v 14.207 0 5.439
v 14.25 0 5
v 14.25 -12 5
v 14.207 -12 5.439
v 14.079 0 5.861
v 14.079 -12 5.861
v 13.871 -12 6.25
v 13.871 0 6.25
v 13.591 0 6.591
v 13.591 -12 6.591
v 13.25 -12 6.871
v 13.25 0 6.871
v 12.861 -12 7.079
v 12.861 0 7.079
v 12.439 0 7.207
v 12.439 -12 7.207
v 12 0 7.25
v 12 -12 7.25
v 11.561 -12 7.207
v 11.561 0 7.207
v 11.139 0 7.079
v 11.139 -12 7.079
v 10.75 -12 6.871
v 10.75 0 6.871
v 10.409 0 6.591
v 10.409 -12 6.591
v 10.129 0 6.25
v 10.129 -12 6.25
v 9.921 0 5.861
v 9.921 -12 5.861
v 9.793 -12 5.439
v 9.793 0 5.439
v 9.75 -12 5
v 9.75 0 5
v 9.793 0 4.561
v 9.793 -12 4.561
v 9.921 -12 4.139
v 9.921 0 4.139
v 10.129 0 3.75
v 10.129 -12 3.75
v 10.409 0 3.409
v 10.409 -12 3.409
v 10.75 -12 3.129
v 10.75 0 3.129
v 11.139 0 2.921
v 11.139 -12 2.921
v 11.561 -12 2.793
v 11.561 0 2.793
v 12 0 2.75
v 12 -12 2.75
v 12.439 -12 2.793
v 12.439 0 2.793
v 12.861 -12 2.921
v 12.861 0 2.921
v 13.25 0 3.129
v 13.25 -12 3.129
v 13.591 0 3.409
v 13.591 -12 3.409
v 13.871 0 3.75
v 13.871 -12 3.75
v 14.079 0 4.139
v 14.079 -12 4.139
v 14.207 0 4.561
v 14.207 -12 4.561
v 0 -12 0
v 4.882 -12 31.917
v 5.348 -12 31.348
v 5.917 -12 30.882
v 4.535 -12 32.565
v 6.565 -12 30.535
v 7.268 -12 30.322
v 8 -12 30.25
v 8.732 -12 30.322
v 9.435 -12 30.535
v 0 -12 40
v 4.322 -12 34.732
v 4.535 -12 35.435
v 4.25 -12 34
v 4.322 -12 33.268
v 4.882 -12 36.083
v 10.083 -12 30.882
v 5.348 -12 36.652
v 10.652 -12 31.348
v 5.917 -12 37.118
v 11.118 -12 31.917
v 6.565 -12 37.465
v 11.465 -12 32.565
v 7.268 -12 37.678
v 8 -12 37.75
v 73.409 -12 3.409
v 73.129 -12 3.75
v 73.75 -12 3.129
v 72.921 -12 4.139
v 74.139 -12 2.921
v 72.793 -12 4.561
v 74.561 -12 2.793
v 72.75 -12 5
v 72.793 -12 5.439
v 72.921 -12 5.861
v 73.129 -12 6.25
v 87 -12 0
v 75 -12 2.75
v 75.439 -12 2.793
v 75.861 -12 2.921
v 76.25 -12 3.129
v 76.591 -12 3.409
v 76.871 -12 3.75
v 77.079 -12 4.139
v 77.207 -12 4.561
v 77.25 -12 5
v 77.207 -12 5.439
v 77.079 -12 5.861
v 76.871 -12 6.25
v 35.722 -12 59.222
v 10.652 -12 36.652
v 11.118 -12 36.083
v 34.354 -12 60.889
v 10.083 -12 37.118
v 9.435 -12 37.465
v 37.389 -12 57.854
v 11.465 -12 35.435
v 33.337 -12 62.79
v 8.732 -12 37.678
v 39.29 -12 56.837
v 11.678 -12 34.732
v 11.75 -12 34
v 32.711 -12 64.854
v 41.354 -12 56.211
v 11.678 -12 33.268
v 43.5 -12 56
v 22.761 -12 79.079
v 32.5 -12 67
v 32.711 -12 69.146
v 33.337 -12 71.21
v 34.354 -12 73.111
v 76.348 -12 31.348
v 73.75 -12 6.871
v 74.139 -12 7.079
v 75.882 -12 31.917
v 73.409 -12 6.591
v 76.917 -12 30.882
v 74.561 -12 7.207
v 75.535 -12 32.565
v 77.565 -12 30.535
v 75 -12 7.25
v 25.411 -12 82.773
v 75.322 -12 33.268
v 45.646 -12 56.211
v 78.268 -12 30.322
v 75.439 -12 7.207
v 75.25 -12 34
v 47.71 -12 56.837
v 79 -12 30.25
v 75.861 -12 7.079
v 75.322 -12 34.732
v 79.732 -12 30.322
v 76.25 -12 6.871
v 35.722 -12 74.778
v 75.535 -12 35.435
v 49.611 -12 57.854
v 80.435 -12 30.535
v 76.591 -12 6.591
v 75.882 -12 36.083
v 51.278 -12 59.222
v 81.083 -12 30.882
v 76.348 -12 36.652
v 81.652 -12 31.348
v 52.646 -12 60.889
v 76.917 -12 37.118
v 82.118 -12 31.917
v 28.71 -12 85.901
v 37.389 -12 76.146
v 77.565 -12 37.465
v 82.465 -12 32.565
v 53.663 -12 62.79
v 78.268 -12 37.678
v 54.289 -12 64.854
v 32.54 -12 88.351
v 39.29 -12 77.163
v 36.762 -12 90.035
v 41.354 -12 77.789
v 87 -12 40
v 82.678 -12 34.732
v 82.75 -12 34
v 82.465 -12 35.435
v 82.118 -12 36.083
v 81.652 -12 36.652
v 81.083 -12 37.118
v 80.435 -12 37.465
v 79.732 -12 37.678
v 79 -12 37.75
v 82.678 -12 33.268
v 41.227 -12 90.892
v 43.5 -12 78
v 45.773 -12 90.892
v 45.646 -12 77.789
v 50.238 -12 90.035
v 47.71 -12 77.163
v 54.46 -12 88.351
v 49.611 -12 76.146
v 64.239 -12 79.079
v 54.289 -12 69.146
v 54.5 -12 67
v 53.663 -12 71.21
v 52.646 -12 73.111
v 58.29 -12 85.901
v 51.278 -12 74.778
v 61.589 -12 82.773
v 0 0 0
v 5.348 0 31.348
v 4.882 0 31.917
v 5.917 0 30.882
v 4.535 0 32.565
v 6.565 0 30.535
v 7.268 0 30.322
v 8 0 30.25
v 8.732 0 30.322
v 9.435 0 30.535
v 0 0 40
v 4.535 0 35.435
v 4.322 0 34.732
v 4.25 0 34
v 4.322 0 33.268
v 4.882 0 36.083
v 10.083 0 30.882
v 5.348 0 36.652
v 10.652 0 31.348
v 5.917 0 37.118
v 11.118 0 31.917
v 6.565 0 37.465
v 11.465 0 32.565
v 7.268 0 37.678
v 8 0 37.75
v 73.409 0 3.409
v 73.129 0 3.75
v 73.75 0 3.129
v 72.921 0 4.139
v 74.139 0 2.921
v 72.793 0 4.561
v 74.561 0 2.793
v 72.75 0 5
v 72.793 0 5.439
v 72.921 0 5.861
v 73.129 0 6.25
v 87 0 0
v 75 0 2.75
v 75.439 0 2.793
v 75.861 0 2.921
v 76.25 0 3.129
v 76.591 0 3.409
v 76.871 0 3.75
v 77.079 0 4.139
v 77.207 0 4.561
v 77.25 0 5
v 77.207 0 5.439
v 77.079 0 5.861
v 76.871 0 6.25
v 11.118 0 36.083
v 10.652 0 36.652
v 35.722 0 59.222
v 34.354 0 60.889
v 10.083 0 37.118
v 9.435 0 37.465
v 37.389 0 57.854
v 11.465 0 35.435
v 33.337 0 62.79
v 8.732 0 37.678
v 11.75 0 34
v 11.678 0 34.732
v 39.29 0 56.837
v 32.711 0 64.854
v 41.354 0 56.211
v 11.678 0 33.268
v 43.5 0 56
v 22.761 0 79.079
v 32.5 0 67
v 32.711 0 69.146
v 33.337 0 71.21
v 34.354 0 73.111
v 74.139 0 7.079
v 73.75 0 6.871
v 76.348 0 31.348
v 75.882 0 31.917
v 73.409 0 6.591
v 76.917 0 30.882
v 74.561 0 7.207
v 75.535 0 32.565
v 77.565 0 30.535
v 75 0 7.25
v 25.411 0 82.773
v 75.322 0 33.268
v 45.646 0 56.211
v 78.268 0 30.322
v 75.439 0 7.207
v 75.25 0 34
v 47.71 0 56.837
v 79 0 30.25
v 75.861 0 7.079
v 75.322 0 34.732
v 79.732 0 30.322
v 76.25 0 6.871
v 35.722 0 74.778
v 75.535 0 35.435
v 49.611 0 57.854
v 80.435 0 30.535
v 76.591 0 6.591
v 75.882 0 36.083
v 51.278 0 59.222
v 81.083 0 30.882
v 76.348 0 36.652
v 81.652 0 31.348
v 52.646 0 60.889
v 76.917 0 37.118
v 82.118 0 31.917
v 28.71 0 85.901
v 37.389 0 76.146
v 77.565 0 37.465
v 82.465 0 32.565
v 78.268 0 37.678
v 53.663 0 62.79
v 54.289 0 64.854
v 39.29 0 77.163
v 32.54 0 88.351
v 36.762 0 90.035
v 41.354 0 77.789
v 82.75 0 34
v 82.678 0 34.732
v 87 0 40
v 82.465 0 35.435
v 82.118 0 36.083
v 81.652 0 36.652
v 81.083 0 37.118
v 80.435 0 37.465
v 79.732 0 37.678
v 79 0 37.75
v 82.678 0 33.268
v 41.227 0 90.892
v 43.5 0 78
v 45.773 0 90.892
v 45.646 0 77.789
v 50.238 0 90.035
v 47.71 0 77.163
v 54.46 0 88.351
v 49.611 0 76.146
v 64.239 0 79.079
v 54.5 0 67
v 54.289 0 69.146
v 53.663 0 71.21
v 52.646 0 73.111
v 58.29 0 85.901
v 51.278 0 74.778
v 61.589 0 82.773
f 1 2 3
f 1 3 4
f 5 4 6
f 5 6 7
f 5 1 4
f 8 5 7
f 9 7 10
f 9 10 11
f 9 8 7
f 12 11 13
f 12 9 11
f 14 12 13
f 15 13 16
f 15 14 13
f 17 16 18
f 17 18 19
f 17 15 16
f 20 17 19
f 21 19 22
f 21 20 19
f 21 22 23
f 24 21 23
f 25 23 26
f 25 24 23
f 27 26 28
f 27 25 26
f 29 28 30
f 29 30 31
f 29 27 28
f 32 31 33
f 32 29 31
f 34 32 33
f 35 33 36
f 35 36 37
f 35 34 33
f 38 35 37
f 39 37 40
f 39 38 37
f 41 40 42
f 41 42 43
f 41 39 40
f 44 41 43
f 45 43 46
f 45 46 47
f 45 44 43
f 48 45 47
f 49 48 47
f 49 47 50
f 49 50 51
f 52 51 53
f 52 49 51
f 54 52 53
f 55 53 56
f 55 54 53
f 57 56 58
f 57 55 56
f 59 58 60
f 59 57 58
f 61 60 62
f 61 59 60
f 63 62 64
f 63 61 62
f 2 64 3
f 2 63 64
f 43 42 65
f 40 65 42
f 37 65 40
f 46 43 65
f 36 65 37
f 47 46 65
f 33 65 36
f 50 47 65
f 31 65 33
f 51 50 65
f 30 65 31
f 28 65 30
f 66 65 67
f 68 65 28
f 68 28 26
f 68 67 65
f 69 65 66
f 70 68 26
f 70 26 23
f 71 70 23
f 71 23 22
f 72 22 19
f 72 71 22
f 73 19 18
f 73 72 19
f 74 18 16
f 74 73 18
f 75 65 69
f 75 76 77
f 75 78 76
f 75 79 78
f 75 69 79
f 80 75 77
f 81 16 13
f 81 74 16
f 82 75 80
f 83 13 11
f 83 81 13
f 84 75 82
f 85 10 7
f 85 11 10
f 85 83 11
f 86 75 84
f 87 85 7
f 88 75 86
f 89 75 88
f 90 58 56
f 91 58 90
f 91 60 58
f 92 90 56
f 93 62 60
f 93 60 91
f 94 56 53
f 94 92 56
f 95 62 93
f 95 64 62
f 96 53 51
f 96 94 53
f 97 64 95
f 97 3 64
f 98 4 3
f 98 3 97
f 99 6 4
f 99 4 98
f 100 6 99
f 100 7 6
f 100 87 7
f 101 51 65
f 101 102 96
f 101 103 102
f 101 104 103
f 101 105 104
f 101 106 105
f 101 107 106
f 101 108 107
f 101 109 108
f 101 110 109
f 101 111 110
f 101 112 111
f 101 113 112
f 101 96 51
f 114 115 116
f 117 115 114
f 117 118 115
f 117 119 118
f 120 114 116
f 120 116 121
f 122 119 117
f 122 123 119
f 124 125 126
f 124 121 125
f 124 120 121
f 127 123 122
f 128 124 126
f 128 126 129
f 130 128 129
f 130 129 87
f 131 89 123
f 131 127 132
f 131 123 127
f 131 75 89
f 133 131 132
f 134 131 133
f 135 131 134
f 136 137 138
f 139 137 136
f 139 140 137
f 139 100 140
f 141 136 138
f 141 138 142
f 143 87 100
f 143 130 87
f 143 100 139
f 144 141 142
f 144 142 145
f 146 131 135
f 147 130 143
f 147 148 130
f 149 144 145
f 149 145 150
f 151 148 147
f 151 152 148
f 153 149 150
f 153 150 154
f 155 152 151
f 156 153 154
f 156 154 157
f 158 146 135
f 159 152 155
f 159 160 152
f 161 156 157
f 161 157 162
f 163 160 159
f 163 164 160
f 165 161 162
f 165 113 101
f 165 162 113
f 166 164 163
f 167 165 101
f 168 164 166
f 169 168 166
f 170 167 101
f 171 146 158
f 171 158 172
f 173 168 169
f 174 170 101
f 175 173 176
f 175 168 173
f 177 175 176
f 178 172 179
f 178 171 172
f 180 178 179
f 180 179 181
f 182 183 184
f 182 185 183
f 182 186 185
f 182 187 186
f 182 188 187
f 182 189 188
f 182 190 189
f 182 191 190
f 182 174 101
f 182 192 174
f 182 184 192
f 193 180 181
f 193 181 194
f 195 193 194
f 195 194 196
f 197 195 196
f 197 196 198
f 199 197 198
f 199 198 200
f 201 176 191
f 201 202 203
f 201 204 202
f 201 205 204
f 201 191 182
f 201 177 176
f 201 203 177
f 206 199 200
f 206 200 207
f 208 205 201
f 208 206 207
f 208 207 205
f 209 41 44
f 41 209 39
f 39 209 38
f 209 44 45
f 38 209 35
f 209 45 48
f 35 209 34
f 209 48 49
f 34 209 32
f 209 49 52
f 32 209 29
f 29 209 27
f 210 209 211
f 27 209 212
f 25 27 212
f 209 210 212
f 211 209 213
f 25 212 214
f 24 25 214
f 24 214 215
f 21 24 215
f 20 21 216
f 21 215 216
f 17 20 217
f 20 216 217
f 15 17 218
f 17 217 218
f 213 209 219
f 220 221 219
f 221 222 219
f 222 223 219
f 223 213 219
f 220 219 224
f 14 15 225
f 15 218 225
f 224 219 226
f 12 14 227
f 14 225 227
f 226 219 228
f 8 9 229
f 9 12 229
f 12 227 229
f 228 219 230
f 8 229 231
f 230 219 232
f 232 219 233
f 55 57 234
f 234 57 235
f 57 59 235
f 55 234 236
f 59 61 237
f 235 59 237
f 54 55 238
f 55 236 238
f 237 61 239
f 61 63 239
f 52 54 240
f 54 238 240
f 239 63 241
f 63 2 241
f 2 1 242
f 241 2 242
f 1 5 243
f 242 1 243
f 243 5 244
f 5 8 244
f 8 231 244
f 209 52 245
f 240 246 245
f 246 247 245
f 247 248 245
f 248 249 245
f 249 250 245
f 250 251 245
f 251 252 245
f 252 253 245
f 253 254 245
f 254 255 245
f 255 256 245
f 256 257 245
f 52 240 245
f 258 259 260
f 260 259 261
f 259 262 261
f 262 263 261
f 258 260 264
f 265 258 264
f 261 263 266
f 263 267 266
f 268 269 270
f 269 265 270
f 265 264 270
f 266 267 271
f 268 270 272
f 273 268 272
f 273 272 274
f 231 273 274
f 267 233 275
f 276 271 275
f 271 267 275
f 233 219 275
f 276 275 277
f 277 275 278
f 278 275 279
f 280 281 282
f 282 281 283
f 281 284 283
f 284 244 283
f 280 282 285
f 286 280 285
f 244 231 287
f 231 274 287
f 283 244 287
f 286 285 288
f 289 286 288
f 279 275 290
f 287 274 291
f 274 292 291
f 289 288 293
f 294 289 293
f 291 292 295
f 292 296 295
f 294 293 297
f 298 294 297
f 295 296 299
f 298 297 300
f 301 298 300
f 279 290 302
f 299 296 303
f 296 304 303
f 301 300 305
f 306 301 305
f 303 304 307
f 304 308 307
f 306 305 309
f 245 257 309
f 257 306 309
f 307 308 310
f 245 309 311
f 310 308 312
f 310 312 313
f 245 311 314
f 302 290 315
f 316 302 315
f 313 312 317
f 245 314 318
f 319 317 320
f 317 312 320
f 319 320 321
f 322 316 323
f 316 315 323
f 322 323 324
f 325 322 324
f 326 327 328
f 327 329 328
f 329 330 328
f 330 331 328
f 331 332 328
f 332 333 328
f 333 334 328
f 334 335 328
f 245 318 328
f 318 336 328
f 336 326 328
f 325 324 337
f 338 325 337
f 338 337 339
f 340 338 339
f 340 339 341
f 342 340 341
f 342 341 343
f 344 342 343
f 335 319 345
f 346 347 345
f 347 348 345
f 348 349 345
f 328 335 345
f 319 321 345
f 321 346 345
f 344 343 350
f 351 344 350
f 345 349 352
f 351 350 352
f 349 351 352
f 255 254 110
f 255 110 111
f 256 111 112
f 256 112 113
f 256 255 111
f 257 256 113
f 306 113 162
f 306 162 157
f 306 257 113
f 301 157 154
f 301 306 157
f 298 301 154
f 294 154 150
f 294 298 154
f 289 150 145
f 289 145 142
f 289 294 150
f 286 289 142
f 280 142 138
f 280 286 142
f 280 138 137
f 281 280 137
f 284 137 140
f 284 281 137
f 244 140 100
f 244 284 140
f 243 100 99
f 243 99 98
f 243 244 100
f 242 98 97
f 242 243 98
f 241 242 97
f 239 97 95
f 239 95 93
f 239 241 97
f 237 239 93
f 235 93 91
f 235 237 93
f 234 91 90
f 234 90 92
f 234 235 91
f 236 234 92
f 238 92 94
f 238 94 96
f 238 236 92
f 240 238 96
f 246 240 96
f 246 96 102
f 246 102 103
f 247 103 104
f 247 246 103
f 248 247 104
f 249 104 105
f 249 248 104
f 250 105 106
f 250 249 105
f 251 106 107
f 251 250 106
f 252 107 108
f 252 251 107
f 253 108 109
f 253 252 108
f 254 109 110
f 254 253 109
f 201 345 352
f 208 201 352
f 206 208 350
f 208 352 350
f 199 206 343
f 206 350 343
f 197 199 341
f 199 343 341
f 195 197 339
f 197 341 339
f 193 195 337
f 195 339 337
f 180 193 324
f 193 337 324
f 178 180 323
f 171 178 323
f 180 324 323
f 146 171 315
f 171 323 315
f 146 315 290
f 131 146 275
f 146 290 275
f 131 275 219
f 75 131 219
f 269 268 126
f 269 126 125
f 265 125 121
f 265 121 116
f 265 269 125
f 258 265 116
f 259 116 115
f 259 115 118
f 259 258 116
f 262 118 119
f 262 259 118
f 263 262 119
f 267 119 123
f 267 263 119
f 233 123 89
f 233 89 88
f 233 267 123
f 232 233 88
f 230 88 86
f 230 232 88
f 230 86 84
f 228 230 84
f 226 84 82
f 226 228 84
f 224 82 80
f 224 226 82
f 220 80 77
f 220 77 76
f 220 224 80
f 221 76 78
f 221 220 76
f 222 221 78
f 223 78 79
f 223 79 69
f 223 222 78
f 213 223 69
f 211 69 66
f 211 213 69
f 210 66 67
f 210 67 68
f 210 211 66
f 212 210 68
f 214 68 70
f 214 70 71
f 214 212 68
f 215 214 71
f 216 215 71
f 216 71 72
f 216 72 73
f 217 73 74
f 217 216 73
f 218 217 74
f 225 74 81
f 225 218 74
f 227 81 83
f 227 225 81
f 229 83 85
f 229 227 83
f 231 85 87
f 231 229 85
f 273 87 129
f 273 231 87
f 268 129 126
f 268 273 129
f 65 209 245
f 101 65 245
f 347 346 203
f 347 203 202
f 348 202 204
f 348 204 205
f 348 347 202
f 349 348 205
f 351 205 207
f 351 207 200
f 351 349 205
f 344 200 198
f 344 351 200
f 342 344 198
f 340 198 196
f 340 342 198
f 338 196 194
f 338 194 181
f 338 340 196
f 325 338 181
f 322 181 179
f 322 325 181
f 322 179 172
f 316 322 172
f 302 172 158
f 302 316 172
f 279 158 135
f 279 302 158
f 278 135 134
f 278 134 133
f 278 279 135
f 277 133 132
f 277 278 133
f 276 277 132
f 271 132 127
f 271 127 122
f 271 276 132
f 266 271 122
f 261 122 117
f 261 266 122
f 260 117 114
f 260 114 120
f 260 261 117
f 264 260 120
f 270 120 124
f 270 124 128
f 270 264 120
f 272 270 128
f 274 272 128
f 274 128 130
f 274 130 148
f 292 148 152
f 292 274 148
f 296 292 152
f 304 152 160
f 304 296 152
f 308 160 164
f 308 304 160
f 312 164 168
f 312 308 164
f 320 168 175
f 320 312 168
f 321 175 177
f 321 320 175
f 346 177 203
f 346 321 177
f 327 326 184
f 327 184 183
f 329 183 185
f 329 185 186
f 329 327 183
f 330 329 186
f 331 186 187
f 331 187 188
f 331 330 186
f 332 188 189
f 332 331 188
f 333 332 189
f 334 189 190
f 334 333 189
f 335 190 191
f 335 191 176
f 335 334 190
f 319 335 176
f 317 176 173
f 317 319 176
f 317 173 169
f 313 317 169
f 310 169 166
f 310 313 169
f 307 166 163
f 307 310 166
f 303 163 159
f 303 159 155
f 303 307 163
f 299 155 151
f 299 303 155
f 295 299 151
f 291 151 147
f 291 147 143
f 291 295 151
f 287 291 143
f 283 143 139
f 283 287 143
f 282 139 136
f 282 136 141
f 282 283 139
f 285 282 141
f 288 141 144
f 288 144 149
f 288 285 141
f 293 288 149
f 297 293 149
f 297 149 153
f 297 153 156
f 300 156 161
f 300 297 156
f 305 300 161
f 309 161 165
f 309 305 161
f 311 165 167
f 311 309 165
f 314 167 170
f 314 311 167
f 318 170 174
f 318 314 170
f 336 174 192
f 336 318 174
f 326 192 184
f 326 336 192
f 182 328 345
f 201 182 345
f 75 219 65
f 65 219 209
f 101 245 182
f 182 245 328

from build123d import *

# Parameters (mm, degrees)
F0_R     = 2.25
F0_R_2   = 3.75
F0_R_3   = 11
F1_DEPTH = 12


with BuildPart() as f1:
    # F0 (on Front) → F1 (new body)
    with BuildSketch(Plane.XZ):
        with BuildLine():
            Line((0, 40), (0, 0))
            Line((0, 0), (87, 0))
            Line((87, 0), (87, 40))
            Line((87, 40), (64.238746, 79.07909))
            ThreePointArc((64.238746, 79.07909), (43.5, 91), (22.761254, 79.07909))
            Line((22.761254, 79.07909), (0, 40))
        make_face()
        with Locations((12, 5)):
            Circle(F0_R, mode=Mode.SUBTRACT)
        with Locations((8, 34)):
            Circle(F0_R_2, mode=Mode.SUBTRACT)
        with Locations((75, 5)):
            Circle(F0_R, mode=Mode.SUBTRACT)
        with Locations((79, 34)):
            Circle(F0_R_2, mode=Mode.SUBTRACT)
        with Locations((43.5, 67)):
            Circle(F0_R_3, mode=Mode.SUBTRACT)
    extrude(amount=F1_DEPTH)


solid = f1.part
